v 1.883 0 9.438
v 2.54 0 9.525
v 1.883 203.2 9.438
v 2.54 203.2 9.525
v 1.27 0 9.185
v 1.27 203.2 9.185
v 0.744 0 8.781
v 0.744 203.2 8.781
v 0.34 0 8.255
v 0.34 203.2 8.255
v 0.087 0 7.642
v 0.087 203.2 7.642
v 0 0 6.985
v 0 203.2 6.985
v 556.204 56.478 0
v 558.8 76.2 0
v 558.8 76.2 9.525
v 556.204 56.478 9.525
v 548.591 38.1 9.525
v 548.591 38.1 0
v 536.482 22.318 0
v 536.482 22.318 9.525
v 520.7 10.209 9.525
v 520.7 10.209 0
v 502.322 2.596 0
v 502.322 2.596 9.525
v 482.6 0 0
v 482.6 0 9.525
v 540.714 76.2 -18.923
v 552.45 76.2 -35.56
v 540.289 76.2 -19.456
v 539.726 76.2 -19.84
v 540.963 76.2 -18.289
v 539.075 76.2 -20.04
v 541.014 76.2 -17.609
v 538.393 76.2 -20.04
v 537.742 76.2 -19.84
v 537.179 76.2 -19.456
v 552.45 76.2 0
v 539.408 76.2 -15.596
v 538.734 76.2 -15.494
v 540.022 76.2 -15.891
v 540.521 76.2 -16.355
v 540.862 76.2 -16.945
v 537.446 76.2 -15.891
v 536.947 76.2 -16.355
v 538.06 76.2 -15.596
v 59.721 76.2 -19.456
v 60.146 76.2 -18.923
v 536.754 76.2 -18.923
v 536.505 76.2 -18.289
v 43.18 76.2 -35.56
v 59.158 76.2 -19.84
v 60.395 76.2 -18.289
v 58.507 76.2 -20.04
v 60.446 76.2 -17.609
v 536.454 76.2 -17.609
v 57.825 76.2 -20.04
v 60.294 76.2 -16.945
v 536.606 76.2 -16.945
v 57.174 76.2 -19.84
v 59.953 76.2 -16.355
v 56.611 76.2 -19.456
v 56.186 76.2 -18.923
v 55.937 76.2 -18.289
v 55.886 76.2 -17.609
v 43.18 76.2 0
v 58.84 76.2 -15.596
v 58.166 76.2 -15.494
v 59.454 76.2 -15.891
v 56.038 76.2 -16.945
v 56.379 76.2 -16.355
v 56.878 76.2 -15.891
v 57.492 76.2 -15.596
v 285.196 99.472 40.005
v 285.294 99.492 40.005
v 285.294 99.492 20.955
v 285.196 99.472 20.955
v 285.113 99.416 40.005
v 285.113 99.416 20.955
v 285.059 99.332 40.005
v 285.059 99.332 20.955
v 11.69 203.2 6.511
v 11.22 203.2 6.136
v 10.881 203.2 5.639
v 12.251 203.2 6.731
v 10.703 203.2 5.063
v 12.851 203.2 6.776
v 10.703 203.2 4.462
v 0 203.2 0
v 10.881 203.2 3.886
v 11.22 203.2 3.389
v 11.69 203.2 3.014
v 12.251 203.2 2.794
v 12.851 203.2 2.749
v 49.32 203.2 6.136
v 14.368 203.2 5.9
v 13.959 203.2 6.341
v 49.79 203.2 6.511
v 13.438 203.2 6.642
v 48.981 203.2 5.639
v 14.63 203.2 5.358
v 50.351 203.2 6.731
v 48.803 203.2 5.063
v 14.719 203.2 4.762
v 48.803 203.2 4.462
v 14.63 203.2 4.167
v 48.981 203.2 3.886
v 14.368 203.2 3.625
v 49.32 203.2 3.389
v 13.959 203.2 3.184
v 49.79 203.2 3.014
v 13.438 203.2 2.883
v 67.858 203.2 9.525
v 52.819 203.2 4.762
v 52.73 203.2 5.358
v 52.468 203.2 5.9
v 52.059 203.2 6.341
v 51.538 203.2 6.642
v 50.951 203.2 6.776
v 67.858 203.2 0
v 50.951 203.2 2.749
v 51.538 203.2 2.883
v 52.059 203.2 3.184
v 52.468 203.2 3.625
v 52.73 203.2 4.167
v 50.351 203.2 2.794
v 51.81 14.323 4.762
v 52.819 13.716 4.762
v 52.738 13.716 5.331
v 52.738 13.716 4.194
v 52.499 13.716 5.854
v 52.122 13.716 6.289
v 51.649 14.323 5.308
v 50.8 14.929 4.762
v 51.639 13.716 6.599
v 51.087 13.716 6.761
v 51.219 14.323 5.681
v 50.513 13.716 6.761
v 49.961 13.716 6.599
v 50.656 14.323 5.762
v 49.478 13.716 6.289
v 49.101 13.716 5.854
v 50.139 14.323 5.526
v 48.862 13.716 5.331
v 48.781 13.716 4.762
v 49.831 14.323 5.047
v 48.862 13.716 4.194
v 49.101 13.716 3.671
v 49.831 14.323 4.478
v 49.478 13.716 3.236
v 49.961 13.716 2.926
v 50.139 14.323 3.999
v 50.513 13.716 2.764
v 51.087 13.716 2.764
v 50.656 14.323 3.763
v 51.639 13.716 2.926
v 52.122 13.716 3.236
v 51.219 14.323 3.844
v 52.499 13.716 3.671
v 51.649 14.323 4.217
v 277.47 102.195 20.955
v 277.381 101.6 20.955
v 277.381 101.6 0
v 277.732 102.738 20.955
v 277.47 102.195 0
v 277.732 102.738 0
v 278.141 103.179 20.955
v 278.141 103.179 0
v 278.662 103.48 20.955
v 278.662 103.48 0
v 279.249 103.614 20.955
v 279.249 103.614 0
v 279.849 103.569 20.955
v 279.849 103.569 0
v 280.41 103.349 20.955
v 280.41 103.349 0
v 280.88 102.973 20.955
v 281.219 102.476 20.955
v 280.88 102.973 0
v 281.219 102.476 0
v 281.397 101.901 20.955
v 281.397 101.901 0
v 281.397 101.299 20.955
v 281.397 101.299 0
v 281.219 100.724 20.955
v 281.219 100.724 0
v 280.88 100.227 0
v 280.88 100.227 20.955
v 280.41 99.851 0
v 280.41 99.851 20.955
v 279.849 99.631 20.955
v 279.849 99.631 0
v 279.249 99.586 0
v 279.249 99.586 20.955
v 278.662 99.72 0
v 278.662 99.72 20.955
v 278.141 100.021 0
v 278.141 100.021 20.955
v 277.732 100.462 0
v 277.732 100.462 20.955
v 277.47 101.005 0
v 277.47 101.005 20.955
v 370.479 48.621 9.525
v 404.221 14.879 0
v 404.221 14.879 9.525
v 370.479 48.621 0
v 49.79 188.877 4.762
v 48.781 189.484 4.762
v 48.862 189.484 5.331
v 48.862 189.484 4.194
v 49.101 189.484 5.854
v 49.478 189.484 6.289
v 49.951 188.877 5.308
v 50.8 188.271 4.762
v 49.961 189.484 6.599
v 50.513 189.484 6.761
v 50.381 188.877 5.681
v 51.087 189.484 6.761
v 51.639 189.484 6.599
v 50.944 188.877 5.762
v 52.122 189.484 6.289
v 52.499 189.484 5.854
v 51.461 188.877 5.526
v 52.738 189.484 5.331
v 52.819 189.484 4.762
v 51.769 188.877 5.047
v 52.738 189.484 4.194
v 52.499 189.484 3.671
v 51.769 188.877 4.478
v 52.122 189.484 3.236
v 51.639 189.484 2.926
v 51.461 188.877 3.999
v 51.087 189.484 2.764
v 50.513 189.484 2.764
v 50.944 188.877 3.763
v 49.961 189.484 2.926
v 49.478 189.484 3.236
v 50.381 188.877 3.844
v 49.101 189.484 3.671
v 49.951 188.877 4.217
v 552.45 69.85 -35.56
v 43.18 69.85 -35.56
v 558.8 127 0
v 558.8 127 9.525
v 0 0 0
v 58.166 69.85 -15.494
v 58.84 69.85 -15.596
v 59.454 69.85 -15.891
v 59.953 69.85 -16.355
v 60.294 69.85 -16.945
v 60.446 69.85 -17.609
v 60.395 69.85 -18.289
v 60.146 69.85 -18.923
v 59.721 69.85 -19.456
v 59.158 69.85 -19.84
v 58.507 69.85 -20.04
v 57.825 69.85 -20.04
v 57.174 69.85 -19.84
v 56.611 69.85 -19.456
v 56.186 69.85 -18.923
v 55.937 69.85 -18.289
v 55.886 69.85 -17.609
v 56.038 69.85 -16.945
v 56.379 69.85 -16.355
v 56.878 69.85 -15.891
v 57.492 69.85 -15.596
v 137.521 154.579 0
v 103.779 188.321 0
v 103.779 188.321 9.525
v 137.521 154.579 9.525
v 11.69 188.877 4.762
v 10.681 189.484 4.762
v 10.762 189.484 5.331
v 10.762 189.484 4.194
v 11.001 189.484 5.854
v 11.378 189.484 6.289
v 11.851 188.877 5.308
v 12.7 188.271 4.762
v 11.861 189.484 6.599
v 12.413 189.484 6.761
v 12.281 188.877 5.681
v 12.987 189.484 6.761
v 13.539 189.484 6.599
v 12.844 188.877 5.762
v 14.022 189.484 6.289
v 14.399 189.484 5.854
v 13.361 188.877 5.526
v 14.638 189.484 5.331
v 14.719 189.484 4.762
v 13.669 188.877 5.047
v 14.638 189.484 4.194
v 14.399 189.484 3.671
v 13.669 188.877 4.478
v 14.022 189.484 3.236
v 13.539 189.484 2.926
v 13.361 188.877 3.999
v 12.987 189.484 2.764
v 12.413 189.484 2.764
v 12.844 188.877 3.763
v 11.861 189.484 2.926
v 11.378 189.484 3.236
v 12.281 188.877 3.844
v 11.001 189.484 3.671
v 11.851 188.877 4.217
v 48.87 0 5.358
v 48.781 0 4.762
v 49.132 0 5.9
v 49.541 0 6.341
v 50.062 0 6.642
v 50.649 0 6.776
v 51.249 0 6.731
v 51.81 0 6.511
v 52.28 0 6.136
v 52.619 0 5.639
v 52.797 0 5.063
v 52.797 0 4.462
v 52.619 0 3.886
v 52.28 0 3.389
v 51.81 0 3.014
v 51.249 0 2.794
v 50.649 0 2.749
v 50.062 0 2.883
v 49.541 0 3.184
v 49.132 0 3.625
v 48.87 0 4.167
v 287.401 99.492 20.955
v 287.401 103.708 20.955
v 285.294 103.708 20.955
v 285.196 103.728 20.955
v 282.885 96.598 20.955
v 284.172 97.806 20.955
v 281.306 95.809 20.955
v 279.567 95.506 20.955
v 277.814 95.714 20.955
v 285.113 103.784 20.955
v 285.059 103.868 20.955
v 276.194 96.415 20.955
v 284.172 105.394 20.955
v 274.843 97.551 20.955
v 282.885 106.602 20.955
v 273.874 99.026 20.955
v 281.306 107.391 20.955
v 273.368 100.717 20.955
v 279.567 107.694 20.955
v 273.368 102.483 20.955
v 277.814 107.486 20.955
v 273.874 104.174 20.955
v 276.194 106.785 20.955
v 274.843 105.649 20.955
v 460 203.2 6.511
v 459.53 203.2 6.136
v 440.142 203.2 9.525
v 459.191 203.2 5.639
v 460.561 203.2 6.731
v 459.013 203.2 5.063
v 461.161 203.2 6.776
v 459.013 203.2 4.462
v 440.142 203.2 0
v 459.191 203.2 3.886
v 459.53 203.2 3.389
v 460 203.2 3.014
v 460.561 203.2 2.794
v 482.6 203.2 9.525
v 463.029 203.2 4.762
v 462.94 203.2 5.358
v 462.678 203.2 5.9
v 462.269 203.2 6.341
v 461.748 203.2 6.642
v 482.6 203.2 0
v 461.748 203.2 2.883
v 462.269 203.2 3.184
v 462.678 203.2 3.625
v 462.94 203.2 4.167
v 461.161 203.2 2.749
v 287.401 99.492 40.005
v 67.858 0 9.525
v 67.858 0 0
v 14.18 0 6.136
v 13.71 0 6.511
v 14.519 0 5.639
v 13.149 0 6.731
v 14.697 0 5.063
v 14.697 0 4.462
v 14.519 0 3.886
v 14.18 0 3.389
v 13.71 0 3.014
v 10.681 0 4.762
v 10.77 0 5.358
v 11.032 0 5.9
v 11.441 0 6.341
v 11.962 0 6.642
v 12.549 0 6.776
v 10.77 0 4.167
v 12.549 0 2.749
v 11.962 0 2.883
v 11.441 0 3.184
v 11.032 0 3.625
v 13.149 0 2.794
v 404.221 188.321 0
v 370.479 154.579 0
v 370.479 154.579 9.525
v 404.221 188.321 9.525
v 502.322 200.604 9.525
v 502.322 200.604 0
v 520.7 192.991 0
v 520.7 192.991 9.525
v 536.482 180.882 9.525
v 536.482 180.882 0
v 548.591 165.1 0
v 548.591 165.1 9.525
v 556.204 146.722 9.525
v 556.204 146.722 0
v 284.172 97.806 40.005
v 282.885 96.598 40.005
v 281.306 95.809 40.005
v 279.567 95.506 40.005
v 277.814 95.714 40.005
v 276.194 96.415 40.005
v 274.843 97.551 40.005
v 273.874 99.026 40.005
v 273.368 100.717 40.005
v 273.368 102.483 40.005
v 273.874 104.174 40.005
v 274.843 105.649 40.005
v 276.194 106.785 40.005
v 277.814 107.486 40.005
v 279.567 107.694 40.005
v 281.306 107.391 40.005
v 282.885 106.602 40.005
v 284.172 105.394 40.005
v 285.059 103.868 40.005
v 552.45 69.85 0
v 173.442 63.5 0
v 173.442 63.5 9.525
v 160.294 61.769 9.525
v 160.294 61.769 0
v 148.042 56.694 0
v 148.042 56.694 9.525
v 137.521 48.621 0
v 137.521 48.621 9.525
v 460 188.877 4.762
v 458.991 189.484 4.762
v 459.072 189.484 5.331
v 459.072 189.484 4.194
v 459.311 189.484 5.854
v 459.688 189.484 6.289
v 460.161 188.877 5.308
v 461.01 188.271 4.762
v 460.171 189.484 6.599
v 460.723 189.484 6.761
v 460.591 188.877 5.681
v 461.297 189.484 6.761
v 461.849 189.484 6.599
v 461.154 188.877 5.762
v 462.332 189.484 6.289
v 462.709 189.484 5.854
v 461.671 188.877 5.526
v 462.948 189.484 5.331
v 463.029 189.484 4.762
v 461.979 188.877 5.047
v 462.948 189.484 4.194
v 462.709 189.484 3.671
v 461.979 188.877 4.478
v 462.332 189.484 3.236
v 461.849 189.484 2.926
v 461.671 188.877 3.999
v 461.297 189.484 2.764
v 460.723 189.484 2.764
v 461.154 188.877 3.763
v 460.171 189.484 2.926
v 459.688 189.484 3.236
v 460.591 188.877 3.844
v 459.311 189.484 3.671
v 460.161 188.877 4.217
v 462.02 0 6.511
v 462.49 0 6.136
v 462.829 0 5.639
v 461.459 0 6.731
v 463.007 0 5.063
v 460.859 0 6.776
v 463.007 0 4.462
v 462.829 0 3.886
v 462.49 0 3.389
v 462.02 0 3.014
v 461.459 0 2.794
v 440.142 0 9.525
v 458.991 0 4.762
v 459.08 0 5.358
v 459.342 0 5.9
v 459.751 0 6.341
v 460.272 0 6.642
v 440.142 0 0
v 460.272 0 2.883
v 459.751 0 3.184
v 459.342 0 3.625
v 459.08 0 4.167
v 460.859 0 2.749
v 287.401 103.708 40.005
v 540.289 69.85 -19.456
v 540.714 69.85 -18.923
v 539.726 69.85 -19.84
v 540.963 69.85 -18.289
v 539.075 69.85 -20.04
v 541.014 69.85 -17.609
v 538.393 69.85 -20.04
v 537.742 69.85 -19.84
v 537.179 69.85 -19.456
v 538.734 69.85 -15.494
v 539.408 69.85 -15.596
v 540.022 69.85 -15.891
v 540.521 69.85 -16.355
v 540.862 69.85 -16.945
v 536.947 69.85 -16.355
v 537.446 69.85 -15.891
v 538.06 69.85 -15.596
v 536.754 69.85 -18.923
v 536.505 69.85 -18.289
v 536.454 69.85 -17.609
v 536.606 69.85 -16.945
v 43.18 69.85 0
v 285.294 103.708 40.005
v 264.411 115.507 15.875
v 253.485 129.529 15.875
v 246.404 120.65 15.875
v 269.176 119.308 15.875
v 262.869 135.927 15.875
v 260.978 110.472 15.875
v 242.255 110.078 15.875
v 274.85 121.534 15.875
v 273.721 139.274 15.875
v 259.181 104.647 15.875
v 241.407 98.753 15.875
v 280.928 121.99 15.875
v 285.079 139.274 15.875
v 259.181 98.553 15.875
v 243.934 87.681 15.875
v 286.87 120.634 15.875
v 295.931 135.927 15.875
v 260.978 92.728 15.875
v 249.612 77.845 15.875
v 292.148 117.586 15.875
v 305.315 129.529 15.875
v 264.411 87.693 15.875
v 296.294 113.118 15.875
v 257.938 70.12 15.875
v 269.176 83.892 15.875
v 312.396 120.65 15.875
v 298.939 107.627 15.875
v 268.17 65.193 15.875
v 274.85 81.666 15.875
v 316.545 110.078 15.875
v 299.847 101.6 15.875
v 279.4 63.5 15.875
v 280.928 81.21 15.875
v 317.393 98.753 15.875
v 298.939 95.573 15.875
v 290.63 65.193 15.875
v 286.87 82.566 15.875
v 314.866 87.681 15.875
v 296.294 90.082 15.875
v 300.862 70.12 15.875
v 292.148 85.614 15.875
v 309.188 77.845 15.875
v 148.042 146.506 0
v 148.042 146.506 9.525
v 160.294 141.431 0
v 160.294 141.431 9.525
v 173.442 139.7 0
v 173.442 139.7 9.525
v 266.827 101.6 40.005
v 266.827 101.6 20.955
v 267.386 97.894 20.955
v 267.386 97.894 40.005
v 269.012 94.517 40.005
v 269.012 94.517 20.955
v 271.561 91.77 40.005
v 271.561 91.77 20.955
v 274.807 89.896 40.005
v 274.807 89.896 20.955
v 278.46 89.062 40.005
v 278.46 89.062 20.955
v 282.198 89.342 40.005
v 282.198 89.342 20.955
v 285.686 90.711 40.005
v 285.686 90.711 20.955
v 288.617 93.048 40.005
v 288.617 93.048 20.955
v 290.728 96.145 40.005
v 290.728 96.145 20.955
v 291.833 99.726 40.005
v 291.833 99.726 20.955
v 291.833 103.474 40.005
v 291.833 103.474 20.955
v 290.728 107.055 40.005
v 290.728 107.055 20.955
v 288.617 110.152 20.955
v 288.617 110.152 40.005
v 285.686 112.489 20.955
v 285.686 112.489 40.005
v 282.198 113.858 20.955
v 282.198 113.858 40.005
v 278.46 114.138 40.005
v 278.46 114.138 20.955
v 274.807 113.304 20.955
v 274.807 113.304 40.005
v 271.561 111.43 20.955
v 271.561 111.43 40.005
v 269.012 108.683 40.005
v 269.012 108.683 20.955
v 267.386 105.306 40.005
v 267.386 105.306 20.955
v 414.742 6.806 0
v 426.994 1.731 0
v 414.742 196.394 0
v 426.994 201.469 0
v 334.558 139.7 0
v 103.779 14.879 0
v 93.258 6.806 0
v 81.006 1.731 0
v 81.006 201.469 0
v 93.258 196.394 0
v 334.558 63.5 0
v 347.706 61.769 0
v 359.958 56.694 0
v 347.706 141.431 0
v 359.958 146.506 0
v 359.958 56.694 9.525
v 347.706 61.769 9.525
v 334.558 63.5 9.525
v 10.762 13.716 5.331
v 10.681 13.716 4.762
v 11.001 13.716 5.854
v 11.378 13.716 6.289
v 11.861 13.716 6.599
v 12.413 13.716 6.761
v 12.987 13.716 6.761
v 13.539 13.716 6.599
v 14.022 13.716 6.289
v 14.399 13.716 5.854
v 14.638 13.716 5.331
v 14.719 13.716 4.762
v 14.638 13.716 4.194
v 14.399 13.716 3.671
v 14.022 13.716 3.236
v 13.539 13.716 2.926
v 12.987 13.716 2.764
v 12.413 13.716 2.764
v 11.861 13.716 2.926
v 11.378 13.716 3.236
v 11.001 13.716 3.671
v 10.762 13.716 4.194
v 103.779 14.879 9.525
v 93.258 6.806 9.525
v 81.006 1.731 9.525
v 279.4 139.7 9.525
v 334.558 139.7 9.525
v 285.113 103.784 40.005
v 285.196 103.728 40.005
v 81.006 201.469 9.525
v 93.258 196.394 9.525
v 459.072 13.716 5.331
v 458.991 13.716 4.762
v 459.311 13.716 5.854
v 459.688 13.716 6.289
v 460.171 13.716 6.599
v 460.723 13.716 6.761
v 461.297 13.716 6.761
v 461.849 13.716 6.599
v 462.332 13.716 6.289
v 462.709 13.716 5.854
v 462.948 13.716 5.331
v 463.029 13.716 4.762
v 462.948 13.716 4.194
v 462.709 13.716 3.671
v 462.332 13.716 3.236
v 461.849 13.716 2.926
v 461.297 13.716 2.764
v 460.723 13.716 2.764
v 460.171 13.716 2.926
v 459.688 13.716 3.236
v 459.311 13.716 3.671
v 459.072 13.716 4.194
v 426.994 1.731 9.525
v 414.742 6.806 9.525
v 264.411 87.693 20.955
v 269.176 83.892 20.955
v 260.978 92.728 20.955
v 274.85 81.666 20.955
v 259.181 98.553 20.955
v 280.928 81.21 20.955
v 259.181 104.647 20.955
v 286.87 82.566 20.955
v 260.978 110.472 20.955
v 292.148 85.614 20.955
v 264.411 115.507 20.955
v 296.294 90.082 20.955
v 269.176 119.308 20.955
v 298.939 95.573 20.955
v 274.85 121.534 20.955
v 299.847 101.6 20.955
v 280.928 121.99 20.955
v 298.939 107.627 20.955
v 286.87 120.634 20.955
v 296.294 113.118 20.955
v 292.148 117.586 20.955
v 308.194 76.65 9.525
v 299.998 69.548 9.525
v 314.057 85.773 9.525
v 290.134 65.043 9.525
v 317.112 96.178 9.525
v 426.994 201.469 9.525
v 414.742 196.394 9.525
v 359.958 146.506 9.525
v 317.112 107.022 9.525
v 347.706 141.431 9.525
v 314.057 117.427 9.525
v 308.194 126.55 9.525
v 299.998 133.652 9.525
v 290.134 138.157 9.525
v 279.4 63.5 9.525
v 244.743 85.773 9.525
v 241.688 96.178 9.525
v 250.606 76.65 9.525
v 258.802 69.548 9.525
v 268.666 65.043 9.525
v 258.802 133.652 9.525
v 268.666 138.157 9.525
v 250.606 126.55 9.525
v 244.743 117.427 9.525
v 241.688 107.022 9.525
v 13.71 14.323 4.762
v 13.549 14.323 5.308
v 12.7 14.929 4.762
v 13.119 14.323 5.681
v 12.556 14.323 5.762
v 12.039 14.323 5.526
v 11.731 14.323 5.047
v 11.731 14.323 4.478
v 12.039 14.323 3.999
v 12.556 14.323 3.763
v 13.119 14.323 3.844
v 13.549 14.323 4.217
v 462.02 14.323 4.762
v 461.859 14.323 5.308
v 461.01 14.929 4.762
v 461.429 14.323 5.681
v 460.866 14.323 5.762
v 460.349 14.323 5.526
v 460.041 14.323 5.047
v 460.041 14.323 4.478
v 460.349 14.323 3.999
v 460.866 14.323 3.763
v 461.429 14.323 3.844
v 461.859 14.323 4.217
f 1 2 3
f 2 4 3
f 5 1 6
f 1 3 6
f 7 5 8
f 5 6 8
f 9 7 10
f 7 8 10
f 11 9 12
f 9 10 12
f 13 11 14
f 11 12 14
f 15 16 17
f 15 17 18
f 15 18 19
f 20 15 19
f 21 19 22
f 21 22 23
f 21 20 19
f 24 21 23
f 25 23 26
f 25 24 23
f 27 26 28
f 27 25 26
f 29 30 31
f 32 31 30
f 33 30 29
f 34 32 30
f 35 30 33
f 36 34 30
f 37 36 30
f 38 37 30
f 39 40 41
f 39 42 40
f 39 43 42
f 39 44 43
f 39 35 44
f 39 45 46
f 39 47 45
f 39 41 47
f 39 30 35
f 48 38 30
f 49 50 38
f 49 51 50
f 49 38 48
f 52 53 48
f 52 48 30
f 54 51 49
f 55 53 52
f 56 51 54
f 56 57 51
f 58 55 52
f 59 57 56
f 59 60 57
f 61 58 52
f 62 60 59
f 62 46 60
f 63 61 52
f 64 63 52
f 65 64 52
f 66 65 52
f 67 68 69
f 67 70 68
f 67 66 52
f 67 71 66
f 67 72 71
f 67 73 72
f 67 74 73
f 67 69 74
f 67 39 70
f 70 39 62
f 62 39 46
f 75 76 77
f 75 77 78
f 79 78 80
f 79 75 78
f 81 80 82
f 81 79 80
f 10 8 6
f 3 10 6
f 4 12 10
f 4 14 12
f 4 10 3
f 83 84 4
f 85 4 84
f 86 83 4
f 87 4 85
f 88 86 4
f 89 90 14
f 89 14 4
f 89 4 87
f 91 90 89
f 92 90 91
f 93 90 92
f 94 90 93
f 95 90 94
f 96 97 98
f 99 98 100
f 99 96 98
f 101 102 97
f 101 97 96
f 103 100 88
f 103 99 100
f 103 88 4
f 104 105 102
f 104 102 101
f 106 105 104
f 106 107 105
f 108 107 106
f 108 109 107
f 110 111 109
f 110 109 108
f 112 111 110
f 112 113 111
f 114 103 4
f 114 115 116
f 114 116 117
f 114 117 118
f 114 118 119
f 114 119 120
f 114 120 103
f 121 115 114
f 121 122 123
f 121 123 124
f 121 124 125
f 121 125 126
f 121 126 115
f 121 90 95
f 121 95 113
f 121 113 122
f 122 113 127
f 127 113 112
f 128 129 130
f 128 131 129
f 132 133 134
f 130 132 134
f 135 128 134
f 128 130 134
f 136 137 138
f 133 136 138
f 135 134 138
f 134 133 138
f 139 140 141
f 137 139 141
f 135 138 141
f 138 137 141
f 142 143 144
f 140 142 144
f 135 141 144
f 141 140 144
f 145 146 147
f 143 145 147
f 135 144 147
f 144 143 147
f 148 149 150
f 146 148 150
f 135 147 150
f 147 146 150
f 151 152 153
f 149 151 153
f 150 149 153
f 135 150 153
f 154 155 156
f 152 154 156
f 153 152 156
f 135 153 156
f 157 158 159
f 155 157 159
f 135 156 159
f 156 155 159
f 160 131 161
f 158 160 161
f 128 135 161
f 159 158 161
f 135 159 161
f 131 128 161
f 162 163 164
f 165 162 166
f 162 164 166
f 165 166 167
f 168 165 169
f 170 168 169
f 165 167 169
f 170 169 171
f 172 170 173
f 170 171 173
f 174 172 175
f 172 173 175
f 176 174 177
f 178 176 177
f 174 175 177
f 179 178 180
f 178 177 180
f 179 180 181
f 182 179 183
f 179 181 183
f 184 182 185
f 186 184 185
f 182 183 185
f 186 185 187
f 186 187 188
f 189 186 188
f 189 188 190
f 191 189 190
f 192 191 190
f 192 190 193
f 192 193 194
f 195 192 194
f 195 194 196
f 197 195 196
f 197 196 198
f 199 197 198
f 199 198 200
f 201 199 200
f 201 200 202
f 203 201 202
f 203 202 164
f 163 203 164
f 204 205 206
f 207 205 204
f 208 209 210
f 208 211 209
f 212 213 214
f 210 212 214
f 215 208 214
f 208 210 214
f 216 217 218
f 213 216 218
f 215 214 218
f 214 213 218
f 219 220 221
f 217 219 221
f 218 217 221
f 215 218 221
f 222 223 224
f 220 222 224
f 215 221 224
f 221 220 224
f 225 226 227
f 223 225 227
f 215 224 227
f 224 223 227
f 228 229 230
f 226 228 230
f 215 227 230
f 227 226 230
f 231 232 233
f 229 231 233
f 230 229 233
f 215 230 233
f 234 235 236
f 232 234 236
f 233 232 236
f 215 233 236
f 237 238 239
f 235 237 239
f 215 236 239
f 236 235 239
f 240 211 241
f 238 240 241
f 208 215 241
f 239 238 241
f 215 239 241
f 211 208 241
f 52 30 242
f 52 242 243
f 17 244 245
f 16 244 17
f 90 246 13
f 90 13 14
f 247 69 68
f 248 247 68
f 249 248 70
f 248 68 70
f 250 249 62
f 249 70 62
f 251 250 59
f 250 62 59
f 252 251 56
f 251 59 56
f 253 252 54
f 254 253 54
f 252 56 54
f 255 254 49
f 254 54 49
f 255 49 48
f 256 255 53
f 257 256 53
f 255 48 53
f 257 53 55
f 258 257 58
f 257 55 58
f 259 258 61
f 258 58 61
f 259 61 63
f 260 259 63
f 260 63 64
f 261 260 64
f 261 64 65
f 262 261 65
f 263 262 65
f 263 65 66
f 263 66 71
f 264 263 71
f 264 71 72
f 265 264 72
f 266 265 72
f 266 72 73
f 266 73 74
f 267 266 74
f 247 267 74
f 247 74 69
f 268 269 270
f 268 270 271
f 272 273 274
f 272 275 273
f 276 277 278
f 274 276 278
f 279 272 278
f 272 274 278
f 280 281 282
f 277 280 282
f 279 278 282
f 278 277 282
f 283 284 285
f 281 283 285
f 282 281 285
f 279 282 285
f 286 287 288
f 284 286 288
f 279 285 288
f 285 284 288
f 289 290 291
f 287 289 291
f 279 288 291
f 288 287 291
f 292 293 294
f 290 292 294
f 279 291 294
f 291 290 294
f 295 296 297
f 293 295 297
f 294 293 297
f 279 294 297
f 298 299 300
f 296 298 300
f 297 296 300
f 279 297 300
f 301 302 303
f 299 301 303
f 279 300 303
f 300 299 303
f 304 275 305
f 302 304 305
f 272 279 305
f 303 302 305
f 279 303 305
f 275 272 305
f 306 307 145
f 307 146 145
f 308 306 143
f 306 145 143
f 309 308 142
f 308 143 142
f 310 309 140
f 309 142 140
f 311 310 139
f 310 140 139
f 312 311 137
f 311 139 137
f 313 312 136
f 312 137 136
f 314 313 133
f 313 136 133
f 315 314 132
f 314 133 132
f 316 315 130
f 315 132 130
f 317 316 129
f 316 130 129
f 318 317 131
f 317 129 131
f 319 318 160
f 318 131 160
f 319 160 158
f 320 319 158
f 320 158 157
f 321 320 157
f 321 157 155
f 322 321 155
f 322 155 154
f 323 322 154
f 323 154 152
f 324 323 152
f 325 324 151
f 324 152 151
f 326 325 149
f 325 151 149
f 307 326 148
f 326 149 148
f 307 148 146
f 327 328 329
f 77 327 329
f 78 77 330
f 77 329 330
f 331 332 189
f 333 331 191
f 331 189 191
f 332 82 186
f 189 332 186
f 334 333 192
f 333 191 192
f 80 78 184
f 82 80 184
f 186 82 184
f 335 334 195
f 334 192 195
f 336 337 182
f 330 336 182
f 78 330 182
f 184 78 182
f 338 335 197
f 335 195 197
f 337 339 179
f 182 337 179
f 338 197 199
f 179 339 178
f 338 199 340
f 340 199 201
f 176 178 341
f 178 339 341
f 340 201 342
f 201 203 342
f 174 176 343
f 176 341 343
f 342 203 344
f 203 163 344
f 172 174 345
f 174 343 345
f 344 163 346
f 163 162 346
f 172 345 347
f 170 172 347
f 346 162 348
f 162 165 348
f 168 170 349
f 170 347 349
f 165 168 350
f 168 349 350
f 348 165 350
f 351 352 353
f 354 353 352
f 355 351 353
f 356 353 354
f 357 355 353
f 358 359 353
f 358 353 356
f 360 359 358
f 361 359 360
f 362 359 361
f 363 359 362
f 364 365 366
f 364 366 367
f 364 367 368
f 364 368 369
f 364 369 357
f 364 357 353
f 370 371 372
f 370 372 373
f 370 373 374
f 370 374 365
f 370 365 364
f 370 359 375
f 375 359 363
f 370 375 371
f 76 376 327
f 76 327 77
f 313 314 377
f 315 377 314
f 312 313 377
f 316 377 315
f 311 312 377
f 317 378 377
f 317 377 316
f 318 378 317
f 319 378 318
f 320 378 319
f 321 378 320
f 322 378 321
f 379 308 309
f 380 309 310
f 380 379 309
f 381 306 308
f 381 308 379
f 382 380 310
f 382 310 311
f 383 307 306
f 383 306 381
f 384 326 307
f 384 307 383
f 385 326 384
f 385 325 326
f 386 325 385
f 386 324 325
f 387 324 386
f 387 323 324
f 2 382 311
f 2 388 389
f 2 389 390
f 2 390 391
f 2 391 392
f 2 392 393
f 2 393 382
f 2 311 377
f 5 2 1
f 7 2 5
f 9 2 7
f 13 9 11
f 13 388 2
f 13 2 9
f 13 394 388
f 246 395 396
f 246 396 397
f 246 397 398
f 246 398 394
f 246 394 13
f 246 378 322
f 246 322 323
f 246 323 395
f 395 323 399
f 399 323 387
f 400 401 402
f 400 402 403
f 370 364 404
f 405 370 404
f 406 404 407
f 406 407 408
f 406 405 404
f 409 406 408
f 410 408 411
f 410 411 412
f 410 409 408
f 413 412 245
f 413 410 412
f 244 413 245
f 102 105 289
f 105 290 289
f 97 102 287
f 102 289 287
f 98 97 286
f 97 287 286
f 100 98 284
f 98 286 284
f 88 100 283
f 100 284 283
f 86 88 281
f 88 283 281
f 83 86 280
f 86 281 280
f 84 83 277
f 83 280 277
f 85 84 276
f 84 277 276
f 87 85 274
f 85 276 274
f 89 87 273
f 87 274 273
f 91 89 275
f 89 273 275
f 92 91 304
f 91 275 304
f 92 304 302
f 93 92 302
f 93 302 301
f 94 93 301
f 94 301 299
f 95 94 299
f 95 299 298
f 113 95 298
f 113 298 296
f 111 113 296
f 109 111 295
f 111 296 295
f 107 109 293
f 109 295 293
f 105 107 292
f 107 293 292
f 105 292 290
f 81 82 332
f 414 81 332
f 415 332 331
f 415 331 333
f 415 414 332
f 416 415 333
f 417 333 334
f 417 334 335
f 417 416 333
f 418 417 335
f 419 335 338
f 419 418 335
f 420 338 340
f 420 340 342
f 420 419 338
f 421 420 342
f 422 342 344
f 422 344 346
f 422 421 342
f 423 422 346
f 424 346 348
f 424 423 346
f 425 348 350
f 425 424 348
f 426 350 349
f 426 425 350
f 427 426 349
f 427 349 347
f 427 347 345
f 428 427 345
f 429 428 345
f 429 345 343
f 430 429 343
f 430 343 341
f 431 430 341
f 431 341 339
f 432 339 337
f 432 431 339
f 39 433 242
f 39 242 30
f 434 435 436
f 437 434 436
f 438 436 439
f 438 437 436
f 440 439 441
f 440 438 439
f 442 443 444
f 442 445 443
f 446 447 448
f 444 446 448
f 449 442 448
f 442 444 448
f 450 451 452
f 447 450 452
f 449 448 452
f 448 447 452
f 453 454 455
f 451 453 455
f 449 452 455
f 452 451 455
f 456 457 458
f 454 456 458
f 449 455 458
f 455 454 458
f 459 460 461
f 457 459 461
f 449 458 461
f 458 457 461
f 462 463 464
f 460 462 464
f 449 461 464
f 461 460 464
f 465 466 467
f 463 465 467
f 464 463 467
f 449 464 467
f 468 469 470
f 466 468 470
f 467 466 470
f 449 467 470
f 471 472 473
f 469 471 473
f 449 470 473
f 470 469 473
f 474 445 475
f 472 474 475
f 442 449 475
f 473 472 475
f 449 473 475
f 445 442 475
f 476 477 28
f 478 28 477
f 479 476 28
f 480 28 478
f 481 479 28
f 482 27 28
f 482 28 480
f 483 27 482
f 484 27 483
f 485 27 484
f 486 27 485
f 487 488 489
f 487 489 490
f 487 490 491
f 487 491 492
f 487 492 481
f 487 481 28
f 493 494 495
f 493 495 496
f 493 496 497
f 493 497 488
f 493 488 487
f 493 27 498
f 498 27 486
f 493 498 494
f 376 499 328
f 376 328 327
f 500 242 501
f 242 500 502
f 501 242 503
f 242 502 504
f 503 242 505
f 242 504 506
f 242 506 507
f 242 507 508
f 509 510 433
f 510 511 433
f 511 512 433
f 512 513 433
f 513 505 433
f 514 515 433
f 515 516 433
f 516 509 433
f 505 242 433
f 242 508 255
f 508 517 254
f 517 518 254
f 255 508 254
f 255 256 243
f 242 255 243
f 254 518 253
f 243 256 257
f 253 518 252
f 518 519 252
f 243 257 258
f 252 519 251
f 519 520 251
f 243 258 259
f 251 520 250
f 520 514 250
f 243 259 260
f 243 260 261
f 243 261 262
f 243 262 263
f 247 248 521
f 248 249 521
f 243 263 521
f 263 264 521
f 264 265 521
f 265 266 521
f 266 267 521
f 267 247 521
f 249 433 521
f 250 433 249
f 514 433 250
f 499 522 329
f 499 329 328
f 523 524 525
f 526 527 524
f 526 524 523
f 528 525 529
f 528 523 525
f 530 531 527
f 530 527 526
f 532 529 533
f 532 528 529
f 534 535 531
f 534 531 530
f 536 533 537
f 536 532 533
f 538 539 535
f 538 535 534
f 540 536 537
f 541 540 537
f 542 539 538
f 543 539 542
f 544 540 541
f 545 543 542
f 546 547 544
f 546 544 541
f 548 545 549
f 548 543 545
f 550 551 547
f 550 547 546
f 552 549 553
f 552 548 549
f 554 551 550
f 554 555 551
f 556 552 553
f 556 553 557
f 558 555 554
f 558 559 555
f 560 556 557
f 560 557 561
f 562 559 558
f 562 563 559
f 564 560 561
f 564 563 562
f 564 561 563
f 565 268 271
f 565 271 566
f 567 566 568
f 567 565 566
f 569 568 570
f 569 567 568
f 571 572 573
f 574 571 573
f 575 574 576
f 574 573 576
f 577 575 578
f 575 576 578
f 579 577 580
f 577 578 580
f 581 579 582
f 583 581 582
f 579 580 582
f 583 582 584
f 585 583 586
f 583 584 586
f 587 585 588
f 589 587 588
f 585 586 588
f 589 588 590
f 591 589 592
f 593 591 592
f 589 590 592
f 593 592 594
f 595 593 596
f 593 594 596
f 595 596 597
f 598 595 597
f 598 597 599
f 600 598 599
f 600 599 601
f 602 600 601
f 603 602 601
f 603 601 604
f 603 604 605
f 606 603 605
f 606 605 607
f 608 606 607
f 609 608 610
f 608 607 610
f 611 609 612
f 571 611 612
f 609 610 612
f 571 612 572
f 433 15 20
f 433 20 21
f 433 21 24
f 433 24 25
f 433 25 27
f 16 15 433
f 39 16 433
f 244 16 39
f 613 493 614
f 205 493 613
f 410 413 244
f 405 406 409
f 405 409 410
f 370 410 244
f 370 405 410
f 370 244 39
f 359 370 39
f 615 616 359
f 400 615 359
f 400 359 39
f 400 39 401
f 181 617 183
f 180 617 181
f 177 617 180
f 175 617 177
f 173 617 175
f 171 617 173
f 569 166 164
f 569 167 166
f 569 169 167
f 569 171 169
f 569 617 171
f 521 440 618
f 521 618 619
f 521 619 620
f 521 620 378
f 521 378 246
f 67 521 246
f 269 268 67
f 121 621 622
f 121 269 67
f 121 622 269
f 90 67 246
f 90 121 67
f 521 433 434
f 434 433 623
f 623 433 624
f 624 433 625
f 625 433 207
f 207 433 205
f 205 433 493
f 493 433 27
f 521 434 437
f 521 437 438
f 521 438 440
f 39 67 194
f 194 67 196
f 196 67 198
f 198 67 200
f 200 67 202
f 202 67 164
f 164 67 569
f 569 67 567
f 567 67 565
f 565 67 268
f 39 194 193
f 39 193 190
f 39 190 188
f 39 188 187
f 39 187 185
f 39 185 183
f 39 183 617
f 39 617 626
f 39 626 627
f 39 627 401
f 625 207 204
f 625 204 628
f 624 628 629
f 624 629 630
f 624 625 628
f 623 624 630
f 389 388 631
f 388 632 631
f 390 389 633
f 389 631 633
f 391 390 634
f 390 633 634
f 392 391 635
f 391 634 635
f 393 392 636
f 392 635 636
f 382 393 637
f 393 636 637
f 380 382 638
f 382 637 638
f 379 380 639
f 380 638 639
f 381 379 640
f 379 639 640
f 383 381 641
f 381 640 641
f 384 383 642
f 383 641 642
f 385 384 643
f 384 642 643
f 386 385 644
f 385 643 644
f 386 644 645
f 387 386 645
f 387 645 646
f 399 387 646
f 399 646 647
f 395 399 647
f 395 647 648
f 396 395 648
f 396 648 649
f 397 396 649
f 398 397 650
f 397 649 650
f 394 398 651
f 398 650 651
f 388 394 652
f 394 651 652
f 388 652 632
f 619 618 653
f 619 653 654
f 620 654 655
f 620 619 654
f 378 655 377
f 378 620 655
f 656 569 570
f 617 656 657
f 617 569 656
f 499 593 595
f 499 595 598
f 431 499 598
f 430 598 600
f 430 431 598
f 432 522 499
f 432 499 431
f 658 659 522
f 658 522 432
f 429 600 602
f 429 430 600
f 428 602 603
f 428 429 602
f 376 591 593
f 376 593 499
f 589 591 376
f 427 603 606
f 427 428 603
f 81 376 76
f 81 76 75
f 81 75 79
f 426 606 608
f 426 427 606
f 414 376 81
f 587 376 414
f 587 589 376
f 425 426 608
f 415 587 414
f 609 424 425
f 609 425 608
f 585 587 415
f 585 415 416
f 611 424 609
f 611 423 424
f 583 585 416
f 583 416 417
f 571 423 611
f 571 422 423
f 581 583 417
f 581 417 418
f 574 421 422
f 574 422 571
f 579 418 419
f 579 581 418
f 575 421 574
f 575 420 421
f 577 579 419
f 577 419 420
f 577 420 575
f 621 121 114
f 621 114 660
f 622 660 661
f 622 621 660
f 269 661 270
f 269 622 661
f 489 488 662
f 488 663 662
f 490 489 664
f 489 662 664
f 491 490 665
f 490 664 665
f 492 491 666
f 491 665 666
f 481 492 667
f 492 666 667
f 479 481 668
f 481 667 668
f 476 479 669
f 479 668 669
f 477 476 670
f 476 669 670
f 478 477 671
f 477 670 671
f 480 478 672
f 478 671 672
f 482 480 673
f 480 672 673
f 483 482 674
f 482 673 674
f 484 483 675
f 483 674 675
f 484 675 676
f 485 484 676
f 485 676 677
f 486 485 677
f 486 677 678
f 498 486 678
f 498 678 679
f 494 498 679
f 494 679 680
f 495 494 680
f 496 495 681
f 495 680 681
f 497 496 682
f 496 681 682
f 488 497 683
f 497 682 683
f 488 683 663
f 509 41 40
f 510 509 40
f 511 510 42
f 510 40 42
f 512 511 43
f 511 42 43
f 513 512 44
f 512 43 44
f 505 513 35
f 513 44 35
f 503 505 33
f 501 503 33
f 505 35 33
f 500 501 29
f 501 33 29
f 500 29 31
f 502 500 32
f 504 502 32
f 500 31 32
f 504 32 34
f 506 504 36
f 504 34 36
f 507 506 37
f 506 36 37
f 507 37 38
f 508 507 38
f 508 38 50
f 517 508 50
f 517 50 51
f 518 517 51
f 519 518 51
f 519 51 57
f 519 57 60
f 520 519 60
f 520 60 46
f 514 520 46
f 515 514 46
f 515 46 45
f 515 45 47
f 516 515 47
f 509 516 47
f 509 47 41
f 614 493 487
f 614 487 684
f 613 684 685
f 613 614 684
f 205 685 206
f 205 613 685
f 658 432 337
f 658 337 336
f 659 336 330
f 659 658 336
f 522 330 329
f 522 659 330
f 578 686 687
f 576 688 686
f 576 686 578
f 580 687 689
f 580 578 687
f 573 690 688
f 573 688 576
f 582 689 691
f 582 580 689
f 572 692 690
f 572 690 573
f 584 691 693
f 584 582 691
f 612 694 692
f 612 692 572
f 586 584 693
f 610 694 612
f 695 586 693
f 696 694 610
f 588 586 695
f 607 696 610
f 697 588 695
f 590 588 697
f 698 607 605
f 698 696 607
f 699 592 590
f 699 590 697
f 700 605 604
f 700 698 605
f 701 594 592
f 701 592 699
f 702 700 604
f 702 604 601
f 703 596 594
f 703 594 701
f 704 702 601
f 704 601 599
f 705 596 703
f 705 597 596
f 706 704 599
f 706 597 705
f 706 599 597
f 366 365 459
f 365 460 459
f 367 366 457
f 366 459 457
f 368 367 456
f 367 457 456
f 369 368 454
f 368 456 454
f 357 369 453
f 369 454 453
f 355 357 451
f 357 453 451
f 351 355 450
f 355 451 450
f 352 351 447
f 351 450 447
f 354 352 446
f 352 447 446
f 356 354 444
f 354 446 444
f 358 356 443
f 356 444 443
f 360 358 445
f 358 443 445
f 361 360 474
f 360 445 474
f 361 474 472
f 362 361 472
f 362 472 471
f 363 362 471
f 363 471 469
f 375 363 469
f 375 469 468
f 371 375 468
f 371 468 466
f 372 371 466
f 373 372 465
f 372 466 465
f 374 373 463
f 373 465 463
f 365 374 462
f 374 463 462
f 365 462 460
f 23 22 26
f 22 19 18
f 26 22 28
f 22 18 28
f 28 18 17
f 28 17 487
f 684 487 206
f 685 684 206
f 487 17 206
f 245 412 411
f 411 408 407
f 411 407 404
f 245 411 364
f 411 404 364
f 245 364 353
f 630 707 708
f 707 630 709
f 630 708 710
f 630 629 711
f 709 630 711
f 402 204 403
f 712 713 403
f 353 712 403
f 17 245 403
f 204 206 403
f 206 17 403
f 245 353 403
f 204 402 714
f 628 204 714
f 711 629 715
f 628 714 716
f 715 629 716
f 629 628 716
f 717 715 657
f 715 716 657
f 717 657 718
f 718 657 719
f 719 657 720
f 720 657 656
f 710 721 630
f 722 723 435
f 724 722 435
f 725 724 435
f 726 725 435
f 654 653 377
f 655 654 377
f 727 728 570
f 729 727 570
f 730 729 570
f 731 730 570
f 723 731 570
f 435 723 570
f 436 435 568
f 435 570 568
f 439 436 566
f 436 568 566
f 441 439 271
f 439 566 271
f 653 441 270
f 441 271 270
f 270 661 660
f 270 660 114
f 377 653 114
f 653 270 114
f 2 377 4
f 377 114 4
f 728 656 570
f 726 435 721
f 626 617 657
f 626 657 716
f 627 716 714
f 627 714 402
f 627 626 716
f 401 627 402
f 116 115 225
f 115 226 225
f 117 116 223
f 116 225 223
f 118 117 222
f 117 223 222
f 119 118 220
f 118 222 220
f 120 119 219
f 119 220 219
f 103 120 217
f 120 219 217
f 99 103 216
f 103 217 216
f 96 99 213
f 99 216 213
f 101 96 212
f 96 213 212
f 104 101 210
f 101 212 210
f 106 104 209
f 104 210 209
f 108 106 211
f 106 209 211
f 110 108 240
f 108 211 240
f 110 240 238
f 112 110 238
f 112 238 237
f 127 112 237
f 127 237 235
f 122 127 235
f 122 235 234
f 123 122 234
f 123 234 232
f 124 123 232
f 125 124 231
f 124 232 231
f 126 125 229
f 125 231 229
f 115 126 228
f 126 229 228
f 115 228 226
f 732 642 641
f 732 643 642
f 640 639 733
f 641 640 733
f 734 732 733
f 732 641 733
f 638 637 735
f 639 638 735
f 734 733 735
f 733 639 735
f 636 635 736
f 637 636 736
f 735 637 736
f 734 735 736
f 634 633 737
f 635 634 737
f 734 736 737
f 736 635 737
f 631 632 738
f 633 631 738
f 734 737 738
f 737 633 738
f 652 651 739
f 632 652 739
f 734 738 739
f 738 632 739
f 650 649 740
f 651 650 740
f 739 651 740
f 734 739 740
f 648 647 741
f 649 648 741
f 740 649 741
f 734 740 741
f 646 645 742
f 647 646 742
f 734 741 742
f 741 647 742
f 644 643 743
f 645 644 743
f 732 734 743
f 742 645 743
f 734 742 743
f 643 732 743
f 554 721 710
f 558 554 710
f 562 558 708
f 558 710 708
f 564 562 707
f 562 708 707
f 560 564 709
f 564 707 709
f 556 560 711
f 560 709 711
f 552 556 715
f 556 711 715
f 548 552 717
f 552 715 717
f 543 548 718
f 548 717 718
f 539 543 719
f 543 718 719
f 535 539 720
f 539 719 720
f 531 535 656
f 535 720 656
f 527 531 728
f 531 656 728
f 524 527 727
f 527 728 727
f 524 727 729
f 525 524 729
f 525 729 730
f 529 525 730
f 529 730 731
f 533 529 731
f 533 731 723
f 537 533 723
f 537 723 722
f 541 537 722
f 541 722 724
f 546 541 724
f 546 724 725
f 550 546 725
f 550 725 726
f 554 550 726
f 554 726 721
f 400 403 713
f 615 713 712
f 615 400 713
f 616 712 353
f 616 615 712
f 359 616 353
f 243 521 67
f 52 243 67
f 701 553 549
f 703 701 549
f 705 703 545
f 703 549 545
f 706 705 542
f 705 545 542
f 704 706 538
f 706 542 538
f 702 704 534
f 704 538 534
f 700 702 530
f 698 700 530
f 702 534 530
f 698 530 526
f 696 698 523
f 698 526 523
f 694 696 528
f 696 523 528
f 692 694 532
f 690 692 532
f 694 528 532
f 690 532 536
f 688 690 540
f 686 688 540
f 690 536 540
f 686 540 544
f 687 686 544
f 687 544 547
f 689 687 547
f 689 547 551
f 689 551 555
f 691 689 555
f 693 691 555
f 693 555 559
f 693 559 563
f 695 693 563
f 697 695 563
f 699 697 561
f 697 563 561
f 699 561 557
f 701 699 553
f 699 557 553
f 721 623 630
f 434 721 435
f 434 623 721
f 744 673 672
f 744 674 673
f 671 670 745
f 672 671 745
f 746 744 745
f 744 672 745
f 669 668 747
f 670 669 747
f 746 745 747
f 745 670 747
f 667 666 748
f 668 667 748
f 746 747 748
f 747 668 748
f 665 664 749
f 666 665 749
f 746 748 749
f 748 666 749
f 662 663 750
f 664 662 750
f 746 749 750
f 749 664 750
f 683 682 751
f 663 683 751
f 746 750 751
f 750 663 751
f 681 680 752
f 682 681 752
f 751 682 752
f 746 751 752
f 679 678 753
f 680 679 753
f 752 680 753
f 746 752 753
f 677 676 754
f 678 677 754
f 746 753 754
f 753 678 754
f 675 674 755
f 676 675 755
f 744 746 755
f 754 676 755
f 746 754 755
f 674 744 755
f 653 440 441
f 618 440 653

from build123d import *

# Parameters (mm, degrees)
BOSS_EXTRUDE1_DEPTH        = 9.525
SKETCH6_W                  = 509.27
SKETCH6_H                  = 6.35
BOSS_EXTRUDE3_DEPTH        = 35.56
SKETCH7_R                  = 2.286
CUT_EXTRUDE4_DEPTH         = 575.152378381
F_10_32_TAPPED_HOLE1_D     = 4.0386
F_10_32_TAPPED_HOLE1_DEPTH = 13.716
F_10_32_TAPPED_HOLE1_TIP   = 1.213317848
F_10_32_TAPPED_HOLE2_D     = 4.0386
F_10_32_TAPPED_HOLE2_DEPTH = 13.716
F_10_32_TAPPED_HOLE2_TIP   = 1.213317848
SKETCH12_R                 = 38.1
BOSS_EXTRUDE4_DEPTH        = 6.35
SKETCH13_R                 = 20.447
BOSS_EXTRUDE5_DEPTH        = 5.08
SKETCH14_R                 = 12.573
BOSS_EXTRUDE6_DEPTH        = 19.05
CUT_EXTRUDE5_DEPTH         = 19.05
FILLET1_R                  = 2.54
F_10_32_TAPPED_HOLE3_D     = 4.0386


with BuildPart() as part:
    # Sketch1 → Boss-Extrude1 (new body)
    with BuildSketch(Plane.XY):
        with BuildLine():
            Line((103.778975516, 188.321024484), (137.521024484, 154.578975516))
            ThreePointArc((137.521024484, 154.578975516), (154.001730604, 143.566919748), (173.442048969, 139.7))
            Line((173.442048969, 139.7), (334.557951031, 139.7))
            ThreePointArc((334.557951031, 139.7), (353.998269396, 143.566919748), (370.478975516, 154.578975516))
            Line((370.478975516, 154.578975516), (404.221024484, 188.321024484))
            ThreePointArc((404.221024484, 188.321024484), (420.701730604, 199.333080252), (440.142048969, 203.2))
            Line((440.142048969, 203.2), (482.6, 203.2))
            ThreePointArc((482.6, 203.2), (536.481536726, 180.881536726), (558.8, 127))
            Line((558.8, 127), (558.8, 76.2))
            ThreePointArc((558.8, 76.2), (536.481536726, 22.318463274), (482.6, 0))
            Line((482.6, 0), (440.142048969, 0))
            ThreePointArc((440.142048969, 0), (420.701730604, 3.866919748), (404.221024484, 14.878975516))
            Line((404.221024484, 14.878975516), (370.478975516, 48.621024484))
            ThreePointArc((370.478975516, 48.621024484), (353.998269396, 59.633080252), (334.557951031, 63.5))
            Line((334.557951031, 63.5), (173.442048969, 63.5))
            ThreePointArc((173.442048969, 63.5), (154.001730604, 59.633080252), (137.521024484, 48.621024484))
            Line((137.521024484, 48.621024484), (103.778975516, 14.878975516))
            ThreePointArc((103.778975516, 14.878975516), (87.298269396, 3.866919748), (67.857951031, 0))
            Line((67.857951031, 0), (0, 0))
            Line((0, 0), (0, 203.2))
            Line((0, 203.2), (67.857951031, 203.2))
            ThreePointArc((67.857951031, 203.2), (87.298269396, 199.333080252), (103.778975516, 188.321024484))
        make_face()
    extrude(amount=BOSS_EXTRUDE1_DEPTH)

    # Sketch6 → Boss-Extrude3 (add)
    with BuildSketch(Plane(origin=(0, 0, 0), x_dir=(-1, 0, 0), z_dir=(0, 0, -1))):
        with Locations((-297.815, 73.025)):
            Rectangle(SKETCH6_W, SKETCH6_H)
    extrude(amount=BOSS_EXTRUDE3_DEPTH)

    # Sketch7 → Cut-Extrude4 (cut, through all)
    with BuildSketch(Plane(origin=(0, 76.2, 0), x_dir=(1, 0, 0), z_dir=(0, 1, 0))):
        with Locations(Location((58.166, 17.78, 0), (0, 0, 270))):
            Circle(SKETCH7_R)
        with Locations(Location((538.734, 17.78, 0), (0, 0, 270))):
            Circle(SKETCH7_R)
    extrude(amount=-CUT_EXTRUDE4_DEPTH, mode=Mode.SUBTRACT)

    # #10-32 Tapped Hole1
    with Locations(Plane(origin=(0, 203.2, 0), x_dir=(-1, 0, 0), z_dir=(0, 1, 0))):
        with Locations((-12.7, 4.7625), (-50.8, 4.7625), (-461.01, 4.7625)):
            Hole(F_10_32_TAPPED_HOLE1_D / 2, depth=F_10_32_TAPPED_HOLE1_DEPTH)
            with Locations((0, 0, -(F_10_32_TAPPED_HOLE1_DEPTH + F_10_32_TAPPED_HOLE1_TIP / 2))):  # 118° drill point
                Cone(0, F_10_32_TAPPED_HOLE1_D / 2, F_10_32_TAPPED_HOLE1_TIP, mode=Mode.SUBTRACT)

    # #10-32 Tapped Hole2
    with Locations(Plane.XZ):
        with Locations((12.7, 4.7625), (50.8, 4.7625), (461.01, 4.7625)):
            Hole(F_10_32_TAPPED_HOLE2_D / 2, depth=F_10_32_TAPPED_HOLE2_DEPTH)
            with Locations((0, 0, -(F_10_32_TAPPED_HOLE2_DEPTH + F_10_32_TAPPED_HOLE2_TIP / 2))):  # 118° drill point
                Cone(0, F_10_32_TAPPED_HOLE2_D / 2, F_10_32_TAPPED_HOLE2_TIP, mode=Mode.SUBTRACT)

    # Sketch12 → Boss-Extrude4 (add)
    with BuildSketch(Plane.XY.offset(9.525)):
        with Locations(Location((279.4, 101.6, 0), (0, 0, 270))):
            Circle(SKETCH12_R)
    extrude(amount=BOSS_EXTRUDE4_DEPTH)

    # Sketch13 → Boss-Extrude5 (add)
    with BuildSketch(Plane.XY.offset(15.875)):
        with Locations((279.4, 101.6)):
            Circle(SKETCH13_R)
    extrude(amount=BOSS_EXTRUDE5_DEPTH)

    # Sketch14 → Boss-Extrude6 (add)
    with BuildSketch(Plane.XY.offset(20.955)):
        with Locations(Location((279.4, 101.6, 0), (0, 0, 180))):
            Circle(SKETCH14_R)
    extrude(amount=BOSS_EXTRUDE6_DEPTH)

    # Sketch15 → Cut-Extrude5 (cut)
    with BuildSketch(Plane.XY.offset(40.005)):
        with BuildLine():
            Line((287.401, 103.7082), (287.401, 99.4918))
            Line((287.401, 99.4918), (285.294277832, 99.4918))
            ThreePointArc((285.294277832, 99.4918), (285.151947147, 99.448175797), (285.058506719, 99.332288))
            ThreePointArc((285.058506719, 99.332288), (273.304, 101.6), (285.058506719, 103.867712))
            ThreePointArc((285.058506719, 103.867712), (285.151947147, 103.751824203), (285.294277832, 103.7082))
            Line((285.294277832, 103.7082), (287.401, 103.7082))
        make_face()
    extrude(amount=-CUT_EXTRUDE5_DEPTH, mode=Mode.SUBTRACT)

    # Fillet1
    fillet1_edges = [part.edges().sort_by_distance(p)[0] for p in [
        (0, 101.6, 9.525),
    ]]
    fillet(fillet1_edges, radius=FILLET1_R)

    # #10-32 Tapped Hole3 (through all)
    with Locations(Plane(origin=(279.4, 101.6, 20.955), x_dir=(1, 0, 0), z_dir=(0, 0, 1))):
        with Locations((0, 0)):
            Hole(F_10_32_TAPPED_HOLE3_D / 2)


solid = part.part
